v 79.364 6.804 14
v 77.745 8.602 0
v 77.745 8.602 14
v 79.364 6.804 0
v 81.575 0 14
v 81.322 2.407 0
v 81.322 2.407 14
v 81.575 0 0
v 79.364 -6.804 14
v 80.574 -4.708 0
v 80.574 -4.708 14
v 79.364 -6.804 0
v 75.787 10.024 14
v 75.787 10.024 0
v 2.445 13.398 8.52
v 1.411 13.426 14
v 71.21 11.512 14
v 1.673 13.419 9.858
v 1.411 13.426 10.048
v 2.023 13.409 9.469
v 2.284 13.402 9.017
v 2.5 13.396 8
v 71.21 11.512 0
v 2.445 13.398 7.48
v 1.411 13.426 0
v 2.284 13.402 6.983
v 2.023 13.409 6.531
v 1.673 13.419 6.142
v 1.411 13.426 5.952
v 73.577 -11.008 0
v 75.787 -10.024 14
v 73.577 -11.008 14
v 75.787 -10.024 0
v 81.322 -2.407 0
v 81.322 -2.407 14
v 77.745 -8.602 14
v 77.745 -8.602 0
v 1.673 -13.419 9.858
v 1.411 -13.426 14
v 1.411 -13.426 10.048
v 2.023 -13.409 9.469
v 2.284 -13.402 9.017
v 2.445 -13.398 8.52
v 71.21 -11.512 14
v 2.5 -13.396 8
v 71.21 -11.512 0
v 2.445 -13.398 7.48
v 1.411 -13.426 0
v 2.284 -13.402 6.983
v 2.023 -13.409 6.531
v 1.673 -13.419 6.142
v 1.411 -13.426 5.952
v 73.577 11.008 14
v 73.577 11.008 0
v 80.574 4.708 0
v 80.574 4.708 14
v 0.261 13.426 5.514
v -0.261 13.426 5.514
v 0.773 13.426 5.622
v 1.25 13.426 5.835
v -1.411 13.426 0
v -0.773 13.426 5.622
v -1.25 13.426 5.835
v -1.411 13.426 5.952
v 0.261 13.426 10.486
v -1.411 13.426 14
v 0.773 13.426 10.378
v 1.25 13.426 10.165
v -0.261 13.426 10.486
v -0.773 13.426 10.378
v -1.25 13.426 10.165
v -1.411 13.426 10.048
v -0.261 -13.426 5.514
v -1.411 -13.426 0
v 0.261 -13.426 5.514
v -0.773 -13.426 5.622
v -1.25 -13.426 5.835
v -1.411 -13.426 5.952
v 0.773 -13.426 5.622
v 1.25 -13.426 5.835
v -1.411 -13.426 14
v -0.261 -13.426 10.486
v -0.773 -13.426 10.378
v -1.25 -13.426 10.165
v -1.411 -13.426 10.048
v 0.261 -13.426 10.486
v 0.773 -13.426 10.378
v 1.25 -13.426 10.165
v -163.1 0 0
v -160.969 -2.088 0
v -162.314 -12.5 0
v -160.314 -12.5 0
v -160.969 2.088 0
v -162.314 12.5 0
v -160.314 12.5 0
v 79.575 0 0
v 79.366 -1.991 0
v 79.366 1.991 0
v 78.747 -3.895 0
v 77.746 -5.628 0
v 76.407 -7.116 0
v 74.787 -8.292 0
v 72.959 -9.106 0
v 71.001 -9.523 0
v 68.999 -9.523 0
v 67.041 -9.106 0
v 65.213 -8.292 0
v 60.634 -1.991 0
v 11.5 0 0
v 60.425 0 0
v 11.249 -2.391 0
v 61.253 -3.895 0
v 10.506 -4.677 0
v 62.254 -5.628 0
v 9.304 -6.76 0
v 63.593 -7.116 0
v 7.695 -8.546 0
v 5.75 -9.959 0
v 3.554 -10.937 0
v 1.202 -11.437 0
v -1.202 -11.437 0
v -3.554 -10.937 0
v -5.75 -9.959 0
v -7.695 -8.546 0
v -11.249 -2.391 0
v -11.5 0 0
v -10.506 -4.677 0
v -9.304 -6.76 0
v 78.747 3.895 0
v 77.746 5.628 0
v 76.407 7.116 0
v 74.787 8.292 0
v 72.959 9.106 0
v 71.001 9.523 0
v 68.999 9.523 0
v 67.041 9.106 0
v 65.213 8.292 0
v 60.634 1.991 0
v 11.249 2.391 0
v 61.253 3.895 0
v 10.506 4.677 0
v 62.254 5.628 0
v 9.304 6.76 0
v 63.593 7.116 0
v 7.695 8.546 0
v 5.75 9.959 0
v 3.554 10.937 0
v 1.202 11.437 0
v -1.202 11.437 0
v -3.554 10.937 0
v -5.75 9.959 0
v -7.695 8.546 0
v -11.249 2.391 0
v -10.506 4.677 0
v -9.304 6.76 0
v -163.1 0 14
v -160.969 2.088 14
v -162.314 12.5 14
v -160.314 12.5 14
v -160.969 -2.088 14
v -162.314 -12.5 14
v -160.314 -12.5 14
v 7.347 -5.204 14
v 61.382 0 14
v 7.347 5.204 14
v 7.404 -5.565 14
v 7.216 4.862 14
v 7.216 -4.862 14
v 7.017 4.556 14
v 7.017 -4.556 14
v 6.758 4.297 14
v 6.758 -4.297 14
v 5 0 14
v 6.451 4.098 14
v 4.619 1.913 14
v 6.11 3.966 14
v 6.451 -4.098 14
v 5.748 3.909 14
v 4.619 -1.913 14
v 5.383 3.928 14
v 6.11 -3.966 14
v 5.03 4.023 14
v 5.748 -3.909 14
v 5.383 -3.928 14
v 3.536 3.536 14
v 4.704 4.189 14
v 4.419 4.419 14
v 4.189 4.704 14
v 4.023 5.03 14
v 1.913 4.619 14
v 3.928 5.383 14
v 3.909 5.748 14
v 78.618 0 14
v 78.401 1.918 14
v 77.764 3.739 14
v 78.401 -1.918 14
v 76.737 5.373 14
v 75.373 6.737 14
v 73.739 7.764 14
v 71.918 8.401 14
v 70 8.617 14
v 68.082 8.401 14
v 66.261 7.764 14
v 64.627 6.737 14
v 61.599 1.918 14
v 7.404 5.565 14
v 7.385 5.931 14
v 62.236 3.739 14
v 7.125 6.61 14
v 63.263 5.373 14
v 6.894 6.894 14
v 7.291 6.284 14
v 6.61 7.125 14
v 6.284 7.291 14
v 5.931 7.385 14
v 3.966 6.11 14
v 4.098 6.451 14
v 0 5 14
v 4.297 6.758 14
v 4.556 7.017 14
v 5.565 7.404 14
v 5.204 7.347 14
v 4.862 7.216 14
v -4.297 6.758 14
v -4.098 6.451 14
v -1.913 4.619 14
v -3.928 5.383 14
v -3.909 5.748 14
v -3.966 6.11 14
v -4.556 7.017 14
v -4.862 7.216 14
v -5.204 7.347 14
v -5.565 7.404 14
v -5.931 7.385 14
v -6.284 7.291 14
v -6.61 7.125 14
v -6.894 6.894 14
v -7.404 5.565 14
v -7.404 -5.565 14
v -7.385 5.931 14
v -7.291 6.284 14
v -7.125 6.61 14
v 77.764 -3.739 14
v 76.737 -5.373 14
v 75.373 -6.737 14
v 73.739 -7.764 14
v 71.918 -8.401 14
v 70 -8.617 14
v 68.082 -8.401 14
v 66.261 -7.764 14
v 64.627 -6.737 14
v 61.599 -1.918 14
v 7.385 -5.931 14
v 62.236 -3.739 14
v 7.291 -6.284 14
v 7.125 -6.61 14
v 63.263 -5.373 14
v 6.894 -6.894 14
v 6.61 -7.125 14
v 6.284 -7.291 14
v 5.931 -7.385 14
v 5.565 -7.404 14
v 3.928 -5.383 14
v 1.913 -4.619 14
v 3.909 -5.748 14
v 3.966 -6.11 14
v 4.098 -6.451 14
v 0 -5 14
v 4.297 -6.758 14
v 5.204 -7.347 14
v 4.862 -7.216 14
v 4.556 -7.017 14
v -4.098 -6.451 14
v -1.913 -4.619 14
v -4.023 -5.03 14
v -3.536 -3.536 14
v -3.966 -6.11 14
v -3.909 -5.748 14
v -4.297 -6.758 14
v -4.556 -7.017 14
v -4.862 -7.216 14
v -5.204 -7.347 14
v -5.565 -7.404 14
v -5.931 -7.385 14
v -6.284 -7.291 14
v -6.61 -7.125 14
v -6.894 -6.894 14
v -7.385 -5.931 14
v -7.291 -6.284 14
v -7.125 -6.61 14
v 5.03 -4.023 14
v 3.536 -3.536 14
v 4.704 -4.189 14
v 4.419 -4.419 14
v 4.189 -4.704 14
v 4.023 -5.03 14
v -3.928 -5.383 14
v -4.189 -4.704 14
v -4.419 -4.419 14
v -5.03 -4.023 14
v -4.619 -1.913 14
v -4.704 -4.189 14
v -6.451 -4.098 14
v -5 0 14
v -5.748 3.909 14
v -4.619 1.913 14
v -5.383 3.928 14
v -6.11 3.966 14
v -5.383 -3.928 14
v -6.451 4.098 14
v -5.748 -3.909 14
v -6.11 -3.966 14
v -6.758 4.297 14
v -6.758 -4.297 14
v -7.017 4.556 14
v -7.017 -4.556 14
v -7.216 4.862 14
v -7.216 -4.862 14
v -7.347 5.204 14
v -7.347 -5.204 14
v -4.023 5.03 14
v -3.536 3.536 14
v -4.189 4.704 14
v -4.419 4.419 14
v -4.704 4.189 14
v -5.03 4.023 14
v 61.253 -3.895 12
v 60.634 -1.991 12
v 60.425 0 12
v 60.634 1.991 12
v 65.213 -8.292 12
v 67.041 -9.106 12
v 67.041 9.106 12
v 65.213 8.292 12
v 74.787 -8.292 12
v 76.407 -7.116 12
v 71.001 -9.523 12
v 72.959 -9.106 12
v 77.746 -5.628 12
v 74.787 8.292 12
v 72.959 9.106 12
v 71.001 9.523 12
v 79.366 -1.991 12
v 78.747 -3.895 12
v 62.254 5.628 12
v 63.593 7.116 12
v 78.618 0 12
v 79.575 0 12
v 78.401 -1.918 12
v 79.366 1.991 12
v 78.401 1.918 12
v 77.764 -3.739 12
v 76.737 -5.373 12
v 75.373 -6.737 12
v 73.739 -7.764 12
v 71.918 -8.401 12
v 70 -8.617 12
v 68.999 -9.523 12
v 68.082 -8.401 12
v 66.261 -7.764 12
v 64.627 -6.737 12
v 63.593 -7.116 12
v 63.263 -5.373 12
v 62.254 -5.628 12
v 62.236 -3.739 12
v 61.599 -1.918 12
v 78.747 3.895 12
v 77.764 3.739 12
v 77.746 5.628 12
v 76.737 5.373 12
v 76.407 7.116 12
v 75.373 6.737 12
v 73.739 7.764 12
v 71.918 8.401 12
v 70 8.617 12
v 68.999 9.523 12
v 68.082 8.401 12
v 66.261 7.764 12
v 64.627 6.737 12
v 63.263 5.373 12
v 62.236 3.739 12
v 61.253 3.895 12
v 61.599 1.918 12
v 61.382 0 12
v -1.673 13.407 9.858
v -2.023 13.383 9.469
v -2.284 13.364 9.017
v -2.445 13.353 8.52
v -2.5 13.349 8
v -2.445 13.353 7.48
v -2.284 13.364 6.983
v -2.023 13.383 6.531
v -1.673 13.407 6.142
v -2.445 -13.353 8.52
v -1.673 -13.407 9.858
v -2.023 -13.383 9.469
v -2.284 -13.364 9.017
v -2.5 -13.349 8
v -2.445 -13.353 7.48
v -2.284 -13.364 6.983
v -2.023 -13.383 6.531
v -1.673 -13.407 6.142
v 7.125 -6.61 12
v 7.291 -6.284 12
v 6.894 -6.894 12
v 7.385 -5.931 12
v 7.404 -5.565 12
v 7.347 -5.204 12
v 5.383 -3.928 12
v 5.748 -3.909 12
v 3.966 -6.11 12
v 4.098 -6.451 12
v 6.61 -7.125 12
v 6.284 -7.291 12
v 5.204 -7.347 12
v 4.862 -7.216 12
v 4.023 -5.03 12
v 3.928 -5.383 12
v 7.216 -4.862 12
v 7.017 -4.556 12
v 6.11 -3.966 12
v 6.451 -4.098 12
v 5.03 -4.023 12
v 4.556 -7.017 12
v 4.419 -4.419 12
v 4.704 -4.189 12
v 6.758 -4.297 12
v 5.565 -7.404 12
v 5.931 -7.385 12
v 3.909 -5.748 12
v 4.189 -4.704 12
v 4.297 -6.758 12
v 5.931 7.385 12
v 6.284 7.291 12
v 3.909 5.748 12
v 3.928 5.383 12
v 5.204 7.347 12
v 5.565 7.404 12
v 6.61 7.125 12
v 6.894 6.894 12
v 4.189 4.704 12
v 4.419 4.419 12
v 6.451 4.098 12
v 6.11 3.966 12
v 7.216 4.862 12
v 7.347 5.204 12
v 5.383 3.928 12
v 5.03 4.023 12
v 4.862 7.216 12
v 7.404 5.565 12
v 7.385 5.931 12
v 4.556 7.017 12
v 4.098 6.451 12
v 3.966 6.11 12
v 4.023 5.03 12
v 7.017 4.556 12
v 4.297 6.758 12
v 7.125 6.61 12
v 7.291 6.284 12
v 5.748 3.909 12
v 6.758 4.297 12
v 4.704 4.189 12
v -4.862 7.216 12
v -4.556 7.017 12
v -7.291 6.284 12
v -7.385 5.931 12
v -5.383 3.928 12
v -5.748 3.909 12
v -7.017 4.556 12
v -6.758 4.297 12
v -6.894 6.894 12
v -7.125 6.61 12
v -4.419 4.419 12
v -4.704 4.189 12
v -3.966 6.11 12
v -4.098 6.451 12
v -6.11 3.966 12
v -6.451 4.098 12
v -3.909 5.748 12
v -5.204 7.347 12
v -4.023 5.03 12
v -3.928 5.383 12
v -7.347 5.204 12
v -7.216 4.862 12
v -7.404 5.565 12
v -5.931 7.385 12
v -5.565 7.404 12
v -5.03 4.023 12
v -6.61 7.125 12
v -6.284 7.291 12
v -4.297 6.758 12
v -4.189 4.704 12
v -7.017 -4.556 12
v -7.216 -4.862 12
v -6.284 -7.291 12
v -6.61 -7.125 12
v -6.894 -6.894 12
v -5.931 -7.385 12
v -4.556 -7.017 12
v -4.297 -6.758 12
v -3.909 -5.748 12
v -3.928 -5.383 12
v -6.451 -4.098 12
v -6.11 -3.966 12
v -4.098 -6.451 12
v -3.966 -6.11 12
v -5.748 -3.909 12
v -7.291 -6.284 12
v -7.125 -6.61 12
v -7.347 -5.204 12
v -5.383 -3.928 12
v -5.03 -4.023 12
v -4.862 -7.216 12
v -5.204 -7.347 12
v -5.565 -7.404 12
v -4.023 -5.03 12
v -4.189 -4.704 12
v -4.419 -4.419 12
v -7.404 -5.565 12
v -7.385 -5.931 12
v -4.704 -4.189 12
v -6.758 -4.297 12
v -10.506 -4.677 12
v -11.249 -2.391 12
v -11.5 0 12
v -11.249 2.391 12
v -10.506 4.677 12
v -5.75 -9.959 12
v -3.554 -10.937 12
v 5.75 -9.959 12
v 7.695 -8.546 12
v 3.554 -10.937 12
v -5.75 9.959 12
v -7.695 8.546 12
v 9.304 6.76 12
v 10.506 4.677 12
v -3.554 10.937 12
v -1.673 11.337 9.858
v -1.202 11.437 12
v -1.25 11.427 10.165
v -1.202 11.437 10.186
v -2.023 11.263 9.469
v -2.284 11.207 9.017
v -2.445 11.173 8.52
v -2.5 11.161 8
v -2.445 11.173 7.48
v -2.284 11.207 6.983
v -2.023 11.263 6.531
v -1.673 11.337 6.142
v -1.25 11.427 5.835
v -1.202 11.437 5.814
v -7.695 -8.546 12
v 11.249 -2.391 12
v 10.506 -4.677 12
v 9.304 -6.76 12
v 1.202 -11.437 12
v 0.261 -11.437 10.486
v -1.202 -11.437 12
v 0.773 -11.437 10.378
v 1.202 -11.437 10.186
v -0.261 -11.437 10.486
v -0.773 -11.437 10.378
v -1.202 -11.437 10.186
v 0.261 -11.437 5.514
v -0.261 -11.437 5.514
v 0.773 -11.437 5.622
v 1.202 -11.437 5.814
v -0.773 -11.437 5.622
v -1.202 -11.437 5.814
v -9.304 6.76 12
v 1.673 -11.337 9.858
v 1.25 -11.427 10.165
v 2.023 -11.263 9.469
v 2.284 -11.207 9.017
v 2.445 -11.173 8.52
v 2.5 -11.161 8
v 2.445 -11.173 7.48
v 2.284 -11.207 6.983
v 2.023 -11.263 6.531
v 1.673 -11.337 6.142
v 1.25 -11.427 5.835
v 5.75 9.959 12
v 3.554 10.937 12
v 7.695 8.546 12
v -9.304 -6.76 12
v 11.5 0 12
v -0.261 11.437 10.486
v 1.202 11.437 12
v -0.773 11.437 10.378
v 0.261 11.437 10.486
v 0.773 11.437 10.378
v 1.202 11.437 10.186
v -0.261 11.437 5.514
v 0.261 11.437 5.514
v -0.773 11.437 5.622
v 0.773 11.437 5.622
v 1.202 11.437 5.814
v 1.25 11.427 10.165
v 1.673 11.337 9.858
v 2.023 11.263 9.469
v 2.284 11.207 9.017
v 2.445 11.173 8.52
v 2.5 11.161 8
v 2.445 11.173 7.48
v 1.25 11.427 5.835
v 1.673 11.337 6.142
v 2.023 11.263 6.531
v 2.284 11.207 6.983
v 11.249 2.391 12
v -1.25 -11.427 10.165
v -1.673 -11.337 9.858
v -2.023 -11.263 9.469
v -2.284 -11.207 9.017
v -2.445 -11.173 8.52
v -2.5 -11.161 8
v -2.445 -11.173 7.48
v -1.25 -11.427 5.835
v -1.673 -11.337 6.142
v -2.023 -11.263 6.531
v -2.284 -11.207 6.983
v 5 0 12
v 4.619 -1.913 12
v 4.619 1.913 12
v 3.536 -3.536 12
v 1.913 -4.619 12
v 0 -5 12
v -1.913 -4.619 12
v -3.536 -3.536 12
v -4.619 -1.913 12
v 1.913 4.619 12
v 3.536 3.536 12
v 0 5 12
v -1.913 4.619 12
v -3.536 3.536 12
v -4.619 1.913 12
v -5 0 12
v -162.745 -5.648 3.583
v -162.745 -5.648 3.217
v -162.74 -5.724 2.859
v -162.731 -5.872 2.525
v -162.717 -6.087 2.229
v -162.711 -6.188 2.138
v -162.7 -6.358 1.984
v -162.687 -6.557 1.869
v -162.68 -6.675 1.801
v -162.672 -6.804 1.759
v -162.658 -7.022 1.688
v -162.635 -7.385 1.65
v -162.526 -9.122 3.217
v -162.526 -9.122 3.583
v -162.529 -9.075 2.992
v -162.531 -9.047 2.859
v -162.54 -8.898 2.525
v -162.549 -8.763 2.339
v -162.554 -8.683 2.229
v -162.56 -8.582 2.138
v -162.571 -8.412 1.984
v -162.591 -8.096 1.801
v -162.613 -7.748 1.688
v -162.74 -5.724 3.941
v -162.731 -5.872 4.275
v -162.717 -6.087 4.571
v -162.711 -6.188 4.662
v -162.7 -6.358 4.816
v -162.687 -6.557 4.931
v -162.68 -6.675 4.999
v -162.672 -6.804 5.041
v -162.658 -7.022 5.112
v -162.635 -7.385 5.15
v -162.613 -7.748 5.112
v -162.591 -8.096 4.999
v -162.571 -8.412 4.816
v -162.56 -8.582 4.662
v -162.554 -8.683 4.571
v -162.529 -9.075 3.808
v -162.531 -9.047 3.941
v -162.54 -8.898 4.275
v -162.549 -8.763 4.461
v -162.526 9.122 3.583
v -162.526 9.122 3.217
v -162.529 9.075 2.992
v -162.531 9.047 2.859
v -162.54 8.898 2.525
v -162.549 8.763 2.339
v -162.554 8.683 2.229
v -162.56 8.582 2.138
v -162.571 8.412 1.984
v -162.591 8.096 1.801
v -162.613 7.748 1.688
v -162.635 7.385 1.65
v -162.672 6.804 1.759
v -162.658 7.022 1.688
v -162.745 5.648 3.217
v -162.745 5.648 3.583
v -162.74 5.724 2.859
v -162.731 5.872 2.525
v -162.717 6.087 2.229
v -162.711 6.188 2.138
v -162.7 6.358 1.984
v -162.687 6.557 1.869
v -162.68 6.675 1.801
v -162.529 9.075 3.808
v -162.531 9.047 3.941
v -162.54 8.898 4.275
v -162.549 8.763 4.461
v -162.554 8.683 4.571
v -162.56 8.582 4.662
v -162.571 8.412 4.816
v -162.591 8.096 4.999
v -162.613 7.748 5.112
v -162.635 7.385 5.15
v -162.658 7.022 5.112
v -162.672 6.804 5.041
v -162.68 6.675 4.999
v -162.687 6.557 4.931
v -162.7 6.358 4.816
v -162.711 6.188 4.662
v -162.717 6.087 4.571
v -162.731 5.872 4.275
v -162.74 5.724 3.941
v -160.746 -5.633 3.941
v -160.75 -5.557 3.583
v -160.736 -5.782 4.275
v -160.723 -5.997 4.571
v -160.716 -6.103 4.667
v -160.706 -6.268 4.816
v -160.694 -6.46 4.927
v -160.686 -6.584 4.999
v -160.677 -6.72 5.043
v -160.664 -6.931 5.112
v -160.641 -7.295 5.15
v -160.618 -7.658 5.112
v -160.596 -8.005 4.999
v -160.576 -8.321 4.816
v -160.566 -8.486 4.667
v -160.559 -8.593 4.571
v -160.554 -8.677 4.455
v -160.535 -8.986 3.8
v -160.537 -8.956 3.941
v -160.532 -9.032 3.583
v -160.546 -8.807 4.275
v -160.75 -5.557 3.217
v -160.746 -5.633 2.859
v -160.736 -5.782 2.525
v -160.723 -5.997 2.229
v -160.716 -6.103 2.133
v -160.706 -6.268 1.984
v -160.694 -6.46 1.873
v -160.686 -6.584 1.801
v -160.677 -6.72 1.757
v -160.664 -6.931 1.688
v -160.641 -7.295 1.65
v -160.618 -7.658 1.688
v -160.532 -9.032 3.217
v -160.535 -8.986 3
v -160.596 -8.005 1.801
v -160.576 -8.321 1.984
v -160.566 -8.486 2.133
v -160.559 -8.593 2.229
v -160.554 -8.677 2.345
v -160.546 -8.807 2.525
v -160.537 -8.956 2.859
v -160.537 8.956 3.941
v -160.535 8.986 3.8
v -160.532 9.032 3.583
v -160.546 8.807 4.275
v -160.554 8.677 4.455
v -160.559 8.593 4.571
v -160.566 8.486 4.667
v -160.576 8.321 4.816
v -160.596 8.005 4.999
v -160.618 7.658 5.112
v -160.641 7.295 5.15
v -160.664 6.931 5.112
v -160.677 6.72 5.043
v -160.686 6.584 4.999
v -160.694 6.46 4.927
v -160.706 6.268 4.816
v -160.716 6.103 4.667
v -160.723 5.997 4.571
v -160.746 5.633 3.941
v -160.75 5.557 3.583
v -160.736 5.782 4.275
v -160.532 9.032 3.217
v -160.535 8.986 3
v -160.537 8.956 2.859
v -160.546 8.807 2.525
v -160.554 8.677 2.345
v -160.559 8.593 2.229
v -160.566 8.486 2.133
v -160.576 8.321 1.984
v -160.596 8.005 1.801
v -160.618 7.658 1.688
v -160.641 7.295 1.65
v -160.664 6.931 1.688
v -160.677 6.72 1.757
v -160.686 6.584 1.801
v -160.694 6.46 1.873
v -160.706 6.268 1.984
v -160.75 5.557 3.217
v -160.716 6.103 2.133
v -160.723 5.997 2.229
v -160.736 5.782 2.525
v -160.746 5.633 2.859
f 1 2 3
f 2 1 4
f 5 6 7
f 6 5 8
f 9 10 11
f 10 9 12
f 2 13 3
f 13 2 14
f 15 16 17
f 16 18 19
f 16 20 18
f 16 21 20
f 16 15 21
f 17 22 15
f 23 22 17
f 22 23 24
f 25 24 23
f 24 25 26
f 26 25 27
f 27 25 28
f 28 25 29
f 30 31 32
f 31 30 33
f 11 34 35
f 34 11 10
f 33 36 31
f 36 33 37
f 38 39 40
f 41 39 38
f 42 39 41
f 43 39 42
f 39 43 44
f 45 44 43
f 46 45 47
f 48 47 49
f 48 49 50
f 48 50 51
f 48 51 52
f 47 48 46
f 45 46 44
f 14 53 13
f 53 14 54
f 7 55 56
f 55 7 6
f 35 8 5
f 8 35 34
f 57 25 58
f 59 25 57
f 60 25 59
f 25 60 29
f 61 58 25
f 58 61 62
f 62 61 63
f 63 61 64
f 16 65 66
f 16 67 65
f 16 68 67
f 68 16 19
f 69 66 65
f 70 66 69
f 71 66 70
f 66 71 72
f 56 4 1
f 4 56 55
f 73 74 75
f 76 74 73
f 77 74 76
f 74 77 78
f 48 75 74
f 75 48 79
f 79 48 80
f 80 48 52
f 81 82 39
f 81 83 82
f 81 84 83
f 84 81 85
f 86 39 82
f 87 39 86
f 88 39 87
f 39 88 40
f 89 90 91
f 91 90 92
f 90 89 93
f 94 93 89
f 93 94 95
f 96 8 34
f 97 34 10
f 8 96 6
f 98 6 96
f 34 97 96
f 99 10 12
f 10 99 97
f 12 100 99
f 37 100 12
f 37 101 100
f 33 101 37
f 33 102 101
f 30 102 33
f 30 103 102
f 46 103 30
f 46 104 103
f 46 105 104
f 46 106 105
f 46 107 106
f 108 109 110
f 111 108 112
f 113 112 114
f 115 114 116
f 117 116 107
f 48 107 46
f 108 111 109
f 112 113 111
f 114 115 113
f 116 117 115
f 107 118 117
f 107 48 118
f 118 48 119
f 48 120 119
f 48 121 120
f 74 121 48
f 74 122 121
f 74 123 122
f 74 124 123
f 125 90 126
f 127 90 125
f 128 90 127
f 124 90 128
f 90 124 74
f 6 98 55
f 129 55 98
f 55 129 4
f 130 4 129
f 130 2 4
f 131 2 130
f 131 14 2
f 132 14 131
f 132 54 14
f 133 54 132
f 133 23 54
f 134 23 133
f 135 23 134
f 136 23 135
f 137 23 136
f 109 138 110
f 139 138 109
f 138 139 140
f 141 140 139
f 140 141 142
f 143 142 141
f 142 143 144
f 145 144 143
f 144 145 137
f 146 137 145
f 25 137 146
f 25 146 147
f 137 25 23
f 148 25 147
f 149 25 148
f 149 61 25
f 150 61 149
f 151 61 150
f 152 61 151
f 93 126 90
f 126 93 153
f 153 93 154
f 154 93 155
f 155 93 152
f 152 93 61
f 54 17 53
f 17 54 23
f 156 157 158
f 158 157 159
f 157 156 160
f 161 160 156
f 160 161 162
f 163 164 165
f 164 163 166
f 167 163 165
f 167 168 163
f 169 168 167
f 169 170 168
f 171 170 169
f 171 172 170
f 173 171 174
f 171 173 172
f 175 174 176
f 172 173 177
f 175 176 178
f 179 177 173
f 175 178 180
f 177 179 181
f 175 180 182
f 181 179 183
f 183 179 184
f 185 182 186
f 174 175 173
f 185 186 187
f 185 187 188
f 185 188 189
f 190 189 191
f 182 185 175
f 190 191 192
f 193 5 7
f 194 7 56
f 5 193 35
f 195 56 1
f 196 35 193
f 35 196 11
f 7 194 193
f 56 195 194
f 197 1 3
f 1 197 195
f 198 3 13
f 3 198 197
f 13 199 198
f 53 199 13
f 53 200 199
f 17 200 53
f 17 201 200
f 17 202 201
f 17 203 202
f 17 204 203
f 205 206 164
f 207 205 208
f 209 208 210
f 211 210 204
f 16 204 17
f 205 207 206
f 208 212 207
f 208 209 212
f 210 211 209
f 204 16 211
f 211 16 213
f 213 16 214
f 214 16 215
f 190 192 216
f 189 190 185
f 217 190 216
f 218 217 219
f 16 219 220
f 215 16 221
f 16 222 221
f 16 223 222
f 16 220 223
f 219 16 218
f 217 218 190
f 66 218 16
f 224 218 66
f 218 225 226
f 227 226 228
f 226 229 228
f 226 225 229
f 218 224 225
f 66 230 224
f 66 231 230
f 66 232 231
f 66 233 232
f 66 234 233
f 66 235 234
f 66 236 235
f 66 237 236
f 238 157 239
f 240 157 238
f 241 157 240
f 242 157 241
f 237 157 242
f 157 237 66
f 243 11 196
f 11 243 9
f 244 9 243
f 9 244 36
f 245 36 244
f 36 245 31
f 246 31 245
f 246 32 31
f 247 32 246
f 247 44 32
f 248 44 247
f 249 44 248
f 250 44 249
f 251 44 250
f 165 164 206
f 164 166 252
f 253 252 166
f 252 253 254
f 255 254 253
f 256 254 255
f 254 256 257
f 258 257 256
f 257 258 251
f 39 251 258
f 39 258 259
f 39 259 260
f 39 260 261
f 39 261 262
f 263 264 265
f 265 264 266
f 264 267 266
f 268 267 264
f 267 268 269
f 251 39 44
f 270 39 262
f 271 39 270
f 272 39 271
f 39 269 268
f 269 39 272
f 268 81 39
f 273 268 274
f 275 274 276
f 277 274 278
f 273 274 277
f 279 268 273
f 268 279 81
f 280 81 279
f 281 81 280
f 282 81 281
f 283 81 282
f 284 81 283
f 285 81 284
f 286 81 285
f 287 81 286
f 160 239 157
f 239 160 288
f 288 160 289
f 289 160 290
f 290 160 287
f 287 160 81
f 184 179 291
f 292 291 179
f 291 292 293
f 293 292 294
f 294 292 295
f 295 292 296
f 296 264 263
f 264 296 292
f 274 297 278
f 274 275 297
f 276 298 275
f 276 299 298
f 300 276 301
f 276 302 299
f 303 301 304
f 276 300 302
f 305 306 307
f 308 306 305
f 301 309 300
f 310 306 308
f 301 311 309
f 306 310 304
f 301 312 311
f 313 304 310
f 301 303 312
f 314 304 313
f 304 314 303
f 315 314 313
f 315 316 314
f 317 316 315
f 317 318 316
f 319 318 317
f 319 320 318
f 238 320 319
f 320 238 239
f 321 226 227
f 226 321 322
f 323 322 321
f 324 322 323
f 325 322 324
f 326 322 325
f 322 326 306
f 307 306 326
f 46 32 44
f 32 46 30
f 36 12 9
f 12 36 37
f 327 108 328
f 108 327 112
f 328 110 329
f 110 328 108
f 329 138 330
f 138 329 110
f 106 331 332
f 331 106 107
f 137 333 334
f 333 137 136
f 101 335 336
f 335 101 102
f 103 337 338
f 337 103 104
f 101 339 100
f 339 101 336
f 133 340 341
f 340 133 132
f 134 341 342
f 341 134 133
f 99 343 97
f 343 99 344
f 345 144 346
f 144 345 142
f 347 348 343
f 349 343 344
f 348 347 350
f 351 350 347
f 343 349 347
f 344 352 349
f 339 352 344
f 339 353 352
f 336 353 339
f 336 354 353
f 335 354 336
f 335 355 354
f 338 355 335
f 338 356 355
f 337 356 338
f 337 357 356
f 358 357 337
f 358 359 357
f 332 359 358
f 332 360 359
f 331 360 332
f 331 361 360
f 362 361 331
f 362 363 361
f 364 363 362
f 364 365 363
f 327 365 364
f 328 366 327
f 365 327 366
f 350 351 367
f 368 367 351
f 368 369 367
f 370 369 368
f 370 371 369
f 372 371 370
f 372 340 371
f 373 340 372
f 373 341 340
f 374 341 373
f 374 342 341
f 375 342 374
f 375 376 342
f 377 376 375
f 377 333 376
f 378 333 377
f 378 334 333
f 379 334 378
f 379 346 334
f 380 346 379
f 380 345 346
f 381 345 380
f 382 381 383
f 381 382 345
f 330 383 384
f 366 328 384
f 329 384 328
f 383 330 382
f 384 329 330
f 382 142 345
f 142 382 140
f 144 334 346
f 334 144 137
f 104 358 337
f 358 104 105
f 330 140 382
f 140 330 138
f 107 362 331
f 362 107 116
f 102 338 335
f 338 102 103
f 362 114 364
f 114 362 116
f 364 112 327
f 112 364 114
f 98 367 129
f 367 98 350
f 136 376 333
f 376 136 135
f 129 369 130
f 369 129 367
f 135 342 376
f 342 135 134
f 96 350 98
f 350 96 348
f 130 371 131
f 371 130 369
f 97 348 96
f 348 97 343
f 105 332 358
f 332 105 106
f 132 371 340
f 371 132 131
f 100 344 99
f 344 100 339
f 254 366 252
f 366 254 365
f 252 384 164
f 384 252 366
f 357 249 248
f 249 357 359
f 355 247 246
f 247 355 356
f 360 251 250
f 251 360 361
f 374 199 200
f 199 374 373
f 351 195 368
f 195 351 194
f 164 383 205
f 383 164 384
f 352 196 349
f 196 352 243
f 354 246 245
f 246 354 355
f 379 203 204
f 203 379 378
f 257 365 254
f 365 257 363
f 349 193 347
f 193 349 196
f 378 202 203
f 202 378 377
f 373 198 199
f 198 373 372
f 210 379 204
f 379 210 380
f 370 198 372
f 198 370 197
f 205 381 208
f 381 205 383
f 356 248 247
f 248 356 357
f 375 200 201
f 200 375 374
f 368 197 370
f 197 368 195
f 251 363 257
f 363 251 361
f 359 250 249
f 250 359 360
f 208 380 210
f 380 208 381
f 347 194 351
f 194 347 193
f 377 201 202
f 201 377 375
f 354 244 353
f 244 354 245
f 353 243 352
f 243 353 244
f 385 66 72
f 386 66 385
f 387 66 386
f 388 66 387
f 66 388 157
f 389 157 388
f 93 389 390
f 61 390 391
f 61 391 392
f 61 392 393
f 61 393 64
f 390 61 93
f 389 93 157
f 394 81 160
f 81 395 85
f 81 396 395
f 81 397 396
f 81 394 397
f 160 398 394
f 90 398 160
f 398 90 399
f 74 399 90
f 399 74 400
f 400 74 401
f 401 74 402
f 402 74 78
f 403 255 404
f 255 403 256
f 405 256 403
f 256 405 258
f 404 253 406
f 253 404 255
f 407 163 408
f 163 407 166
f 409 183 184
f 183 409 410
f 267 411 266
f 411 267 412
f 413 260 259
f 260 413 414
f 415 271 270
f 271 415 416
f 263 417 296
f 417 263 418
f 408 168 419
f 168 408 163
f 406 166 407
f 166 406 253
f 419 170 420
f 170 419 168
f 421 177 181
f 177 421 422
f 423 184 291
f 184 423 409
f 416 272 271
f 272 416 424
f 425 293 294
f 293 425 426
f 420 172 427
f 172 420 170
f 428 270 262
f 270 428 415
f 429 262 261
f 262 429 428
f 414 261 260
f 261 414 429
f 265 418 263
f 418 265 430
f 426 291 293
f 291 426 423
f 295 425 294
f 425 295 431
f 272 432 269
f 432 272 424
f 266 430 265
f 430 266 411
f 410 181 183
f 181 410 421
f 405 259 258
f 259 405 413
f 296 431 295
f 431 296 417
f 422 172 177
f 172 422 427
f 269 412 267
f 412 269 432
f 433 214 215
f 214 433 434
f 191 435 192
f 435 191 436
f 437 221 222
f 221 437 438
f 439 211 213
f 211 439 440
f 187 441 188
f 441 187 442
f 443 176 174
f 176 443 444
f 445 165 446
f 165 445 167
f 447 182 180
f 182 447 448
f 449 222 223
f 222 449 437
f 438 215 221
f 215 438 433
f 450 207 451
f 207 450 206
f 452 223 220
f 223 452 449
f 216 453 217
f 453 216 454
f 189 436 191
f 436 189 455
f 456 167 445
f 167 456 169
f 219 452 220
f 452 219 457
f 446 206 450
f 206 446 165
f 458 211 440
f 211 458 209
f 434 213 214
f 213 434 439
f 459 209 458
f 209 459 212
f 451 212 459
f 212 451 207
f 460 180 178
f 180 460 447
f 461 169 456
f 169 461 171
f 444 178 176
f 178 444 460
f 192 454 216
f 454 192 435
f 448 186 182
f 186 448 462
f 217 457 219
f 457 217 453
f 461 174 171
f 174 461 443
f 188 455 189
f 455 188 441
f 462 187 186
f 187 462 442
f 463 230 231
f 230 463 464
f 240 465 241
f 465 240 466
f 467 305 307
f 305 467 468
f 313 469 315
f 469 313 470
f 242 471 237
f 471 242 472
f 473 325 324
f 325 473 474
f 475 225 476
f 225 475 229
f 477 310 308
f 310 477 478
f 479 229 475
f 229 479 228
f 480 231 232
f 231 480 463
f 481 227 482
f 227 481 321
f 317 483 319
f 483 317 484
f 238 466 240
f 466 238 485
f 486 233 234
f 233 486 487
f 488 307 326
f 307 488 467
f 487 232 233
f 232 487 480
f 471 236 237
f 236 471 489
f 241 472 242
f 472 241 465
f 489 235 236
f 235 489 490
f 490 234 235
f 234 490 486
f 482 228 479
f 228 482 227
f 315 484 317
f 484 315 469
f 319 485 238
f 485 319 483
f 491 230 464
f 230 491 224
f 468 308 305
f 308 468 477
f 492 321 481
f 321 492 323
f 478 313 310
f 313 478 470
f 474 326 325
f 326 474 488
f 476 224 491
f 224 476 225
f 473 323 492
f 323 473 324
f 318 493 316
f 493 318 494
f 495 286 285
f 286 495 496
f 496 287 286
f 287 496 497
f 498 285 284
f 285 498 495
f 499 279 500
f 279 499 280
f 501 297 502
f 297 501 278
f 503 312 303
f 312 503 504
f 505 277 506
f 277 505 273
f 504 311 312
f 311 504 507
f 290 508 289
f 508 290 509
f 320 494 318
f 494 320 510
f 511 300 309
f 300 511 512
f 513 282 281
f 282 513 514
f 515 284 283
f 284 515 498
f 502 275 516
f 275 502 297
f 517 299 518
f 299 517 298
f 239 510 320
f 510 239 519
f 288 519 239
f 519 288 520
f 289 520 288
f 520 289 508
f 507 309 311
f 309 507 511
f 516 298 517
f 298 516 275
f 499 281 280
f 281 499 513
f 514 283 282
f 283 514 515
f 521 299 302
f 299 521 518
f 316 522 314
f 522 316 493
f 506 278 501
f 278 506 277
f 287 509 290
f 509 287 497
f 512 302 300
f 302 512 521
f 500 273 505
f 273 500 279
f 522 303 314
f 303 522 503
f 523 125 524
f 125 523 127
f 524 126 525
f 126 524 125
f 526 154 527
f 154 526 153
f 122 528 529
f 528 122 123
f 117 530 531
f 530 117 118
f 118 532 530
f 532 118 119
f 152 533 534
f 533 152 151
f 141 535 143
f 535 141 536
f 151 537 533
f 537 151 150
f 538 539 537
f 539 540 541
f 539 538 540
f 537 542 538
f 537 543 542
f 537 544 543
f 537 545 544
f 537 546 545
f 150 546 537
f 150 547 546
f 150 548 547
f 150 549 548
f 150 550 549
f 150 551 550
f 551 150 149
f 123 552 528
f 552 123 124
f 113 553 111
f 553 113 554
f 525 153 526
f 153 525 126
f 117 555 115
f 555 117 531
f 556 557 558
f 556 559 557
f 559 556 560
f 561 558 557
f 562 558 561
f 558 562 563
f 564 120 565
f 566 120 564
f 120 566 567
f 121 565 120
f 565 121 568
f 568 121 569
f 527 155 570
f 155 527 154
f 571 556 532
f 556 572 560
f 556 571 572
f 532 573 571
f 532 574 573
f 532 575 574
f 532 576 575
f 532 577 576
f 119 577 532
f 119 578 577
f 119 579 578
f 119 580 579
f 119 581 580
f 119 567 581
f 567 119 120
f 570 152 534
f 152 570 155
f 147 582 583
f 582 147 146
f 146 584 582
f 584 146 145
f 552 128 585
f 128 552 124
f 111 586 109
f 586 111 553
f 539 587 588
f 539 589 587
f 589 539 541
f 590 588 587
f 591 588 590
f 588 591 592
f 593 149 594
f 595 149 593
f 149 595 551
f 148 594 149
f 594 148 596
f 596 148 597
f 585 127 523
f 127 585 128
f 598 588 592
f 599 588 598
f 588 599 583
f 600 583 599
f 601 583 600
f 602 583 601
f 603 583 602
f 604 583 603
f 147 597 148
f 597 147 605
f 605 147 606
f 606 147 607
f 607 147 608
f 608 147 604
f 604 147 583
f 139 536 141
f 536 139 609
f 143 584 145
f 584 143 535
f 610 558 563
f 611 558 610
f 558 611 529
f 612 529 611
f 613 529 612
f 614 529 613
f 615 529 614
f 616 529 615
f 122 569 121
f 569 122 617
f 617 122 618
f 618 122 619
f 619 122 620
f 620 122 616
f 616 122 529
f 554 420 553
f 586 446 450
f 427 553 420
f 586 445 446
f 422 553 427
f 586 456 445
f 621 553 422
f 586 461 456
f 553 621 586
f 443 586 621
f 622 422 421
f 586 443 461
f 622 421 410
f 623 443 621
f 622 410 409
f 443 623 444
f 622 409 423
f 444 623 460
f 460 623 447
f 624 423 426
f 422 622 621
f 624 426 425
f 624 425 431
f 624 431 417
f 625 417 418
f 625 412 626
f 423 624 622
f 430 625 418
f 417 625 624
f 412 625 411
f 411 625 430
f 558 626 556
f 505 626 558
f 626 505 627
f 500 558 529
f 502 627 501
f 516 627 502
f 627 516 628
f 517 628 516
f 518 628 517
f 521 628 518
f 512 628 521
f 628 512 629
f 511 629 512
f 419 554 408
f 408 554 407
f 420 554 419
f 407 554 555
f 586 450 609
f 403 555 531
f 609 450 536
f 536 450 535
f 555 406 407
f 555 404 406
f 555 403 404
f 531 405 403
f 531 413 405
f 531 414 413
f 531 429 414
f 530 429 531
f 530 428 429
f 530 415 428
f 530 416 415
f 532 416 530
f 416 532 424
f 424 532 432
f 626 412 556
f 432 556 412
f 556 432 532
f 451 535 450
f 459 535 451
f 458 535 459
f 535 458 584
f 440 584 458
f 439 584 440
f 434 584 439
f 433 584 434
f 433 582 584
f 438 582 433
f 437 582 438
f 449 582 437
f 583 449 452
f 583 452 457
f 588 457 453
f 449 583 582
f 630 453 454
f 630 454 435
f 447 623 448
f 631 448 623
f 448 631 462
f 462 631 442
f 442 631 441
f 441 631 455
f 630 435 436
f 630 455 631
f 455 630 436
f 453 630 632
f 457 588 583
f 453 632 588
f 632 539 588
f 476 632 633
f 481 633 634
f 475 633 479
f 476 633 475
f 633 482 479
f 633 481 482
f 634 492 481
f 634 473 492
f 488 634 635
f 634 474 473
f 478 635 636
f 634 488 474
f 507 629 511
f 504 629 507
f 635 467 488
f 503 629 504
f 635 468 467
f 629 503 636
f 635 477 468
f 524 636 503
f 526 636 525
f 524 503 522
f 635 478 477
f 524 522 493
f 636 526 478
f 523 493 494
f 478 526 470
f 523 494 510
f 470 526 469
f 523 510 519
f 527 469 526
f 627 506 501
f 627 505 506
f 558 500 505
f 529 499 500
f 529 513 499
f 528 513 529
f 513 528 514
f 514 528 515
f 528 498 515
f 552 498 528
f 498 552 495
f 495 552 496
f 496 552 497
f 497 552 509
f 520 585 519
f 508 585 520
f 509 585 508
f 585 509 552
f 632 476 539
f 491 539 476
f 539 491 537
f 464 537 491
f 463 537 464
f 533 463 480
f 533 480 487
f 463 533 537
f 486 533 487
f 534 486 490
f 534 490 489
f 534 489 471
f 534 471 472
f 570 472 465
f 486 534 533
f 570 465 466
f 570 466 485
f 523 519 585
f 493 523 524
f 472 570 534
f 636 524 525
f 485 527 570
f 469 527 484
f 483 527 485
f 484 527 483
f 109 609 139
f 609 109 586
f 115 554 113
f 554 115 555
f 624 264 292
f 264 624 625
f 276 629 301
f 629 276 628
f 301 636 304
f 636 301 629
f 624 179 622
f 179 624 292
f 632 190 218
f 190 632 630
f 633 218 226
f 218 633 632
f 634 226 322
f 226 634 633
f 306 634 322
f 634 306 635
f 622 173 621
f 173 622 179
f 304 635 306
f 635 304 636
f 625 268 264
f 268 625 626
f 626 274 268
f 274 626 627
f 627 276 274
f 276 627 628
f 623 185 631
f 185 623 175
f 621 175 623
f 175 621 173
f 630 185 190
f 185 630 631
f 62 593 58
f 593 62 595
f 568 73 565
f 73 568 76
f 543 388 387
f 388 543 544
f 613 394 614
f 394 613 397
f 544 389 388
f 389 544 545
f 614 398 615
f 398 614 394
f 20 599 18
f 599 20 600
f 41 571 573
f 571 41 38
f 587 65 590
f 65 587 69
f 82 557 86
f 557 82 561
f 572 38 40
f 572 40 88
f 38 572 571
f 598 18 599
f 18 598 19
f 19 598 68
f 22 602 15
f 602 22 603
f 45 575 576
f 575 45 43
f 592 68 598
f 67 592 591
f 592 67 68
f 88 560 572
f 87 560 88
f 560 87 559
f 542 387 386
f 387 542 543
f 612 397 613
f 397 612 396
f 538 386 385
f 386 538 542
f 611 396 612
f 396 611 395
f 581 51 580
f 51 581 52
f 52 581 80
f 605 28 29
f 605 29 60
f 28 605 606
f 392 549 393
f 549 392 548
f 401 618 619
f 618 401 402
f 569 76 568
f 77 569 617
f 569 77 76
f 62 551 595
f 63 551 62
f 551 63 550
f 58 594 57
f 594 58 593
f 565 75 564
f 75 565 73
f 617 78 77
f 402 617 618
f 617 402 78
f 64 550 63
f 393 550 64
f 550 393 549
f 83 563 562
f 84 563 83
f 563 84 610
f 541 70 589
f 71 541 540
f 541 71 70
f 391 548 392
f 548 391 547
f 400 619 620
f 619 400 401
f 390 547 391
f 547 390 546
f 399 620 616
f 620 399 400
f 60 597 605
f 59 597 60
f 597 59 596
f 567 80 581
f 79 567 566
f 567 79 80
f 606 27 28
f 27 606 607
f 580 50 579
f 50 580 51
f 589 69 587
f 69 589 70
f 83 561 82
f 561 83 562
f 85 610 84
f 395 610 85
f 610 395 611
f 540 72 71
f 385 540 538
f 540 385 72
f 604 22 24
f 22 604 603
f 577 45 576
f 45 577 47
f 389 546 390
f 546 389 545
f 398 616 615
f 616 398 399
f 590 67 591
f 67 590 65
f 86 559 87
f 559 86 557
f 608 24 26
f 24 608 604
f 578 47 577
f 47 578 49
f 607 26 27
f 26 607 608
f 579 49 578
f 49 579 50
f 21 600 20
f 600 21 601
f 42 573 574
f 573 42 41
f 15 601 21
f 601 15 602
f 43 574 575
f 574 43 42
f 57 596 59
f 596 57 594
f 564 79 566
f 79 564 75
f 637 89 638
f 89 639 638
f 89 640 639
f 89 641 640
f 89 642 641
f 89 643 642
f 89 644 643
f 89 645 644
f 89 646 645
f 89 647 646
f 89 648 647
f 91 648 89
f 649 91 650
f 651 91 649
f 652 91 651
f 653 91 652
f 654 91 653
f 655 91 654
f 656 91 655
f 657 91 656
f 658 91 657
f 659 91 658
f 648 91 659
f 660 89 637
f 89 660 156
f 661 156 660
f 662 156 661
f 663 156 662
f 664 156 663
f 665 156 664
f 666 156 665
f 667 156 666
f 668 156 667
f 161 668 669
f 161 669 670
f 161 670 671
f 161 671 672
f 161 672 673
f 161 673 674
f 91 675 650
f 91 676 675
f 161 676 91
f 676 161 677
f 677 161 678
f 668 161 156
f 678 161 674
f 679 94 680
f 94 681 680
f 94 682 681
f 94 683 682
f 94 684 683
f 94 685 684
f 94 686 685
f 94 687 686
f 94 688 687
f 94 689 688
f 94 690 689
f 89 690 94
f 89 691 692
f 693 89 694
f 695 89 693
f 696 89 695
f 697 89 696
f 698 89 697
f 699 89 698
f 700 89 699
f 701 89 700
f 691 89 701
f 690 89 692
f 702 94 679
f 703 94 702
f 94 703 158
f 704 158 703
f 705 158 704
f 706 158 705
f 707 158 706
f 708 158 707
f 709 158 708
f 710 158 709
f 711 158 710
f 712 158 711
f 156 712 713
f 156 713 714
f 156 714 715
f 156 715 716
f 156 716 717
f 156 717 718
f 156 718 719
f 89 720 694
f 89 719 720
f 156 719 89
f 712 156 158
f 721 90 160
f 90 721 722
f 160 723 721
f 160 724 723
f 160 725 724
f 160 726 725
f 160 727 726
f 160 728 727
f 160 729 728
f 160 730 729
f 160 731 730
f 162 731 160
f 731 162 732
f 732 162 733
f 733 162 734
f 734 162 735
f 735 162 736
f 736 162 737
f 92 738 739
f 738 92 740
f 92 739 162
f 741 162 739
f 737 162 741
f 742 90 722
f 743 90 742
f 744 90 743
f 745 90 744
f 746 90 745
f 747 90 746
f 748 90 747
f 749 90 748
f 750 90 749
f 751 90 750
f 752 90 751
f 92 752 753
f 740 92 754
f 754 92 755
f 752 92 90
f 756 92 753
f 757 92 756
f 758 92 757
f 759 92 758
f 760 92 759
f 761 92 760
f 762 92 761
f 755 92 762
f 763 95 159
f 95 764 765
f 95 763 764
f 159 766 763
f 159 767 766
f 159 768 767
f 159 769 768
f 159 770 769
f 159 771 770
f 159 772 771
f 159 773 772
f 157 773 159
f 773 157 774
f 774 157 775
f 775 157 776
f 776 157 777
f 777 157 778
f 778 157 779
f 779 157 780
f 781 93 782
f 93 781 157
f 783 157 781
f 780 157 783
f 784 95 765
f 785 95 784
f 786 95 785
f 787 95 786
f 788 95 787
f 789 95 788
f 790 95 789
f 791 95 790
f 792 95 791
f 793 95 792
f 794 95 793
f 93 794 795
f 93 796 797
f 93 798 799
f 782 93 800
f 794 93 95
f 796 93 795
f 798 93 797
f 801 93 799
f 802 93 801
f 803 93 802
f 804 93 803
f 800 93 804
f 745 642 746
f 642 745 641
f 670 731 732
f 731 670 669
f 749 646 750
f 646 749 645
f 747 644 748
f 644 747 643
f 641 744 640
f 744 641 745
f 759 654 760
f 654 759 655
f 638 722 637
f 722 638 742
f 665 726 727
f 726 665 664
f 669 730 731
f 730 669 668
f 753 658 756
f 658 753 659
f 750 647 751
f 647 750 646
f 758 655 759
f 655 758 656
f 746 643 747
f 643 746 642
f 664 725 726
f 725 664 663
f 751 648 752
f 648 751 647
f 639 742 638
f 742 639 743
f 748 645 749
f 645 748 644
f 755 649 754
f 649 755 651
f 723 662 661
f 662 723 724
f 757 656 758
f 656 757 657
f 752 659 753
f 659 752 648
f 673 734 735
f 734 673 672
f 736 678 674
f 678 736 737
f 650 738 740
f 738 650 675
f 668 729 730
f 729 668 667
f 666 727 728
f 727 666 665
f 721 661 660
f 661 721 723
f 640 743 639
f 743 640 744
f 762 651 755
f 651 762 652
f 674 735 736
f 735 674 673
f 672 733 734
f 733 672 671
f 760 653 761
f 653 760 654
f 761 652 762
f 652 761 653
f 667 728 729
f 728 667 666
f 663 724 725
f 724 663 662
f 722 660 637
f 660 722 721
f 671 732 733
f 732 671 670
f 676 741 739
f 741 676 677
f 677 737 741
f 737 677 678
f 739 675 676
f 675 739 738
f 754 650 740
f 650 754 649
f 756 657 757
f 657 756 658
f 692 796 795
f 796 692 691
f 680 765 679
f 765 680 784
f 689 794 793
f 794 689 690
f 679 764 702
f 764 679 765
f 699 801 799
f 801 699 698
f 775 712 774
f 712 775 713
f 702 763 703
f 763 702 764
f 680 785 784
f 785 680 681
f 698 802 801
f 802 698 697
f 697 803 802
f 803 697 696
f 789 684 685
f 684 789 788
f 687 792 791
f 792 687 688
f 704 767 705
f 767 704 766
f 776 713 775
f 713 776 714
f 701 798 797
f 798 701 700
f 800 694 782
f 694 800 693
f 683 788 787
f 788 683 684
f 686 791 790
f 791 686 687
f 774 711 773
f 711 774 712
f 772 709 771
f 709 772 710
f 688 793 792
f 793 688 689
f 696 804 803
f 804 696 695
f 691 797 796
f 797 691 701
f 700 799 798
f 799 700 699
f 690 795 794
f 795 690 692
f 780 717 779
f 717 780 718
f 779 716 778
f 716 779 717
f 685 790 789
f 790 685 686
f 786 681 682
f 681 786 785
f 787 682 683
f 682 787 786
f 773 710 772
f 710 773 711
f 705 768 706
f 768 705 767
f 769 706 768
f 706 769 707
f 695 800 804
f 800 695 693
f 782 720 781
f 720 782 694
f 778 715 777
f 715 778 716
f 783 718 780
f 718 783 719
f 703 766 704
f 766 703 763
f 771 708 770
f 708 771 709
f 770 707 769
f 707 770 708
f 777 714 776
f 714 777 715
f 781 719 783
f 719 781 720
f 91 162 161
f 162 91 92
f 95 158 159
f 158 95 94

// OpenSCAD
inch = 25.4;

globe_d = 13 * inch;
globe_r = globe_d/2;
globe_thickness = 2;
globe_ir = globe_r - globe_thickness;


height = 14;

RR = 70;
rr = RR - 40;
dd = 8; // magnet support offset from globe_ir

flange_d = 23;
um3_tol = .1;
penny_d = .75 * inch + um3_tol;
penny_t = .06 * inch;

module penny_compartment(dd){
  difference(){
    hull(){
      translate([0,0,0])cylinder(d=flange_d + 4, h=height);
      translate([-dd,0,0])cylinder(d=penny_d + 4, h=height);
    }
    translate([0,0,-2])translate([-dd,0,0])cylinder(d=penny_d, h=height);
    translate([0,0,-2])translate([-dd,0,0])cylinder(d=penny_d * .9, h=height * 2);
  }
  difference(){
    cylinder(d=flange_d + 4, h=.2);
    translate([0,0,-1])cylinder(d=penny_d - .2, h=3);
  }
}

module aov_arm(){
  rotate([0,0,180]){
    difference(){
      union(){
	hull(){
	  cylinder(d=flange_d + 4, h=height);
	  translate([globe_ir-1,-2,0])cube([.1,4,height]);
	}
	penny_compartment(70);
      }
      translate([0,0,-1])cylinder(h=height-1, d=flange_d);
      translate([0,0,-1])cylinder(h=height*2, d=10);
      for(i=[1:4]){
	rotate([0,0,45 + 90 * i])translate([8,0,0])cylinder(d=3.5, h=30, $fn=30);
      }
      translate([0,0,8])rotate([90,0,0])cylinder(d=5, h=40, $fn=30, center=true);
    }

    intersection(){
      difference(){
	cylinder(r=globe_ir, h=height, $fn=50);
	translate([0,0,-1])cylinder(r=globe_ir-2, h=height+2, $fn=50);
	rotate([90,0,0])translate([0,8,0])cylinder(d=5, h=30, $fn=30);
	rotate([0, 0, 180+2.6])translate([-200, 0, 3.4])
	  rotate([0, 90, 0])cylinder(d=3.5, h=100, $fn=30);
	rotate([0, 0, 180-2.6])translate([-200, 0, 3.4])
	  rotate([0, 90, 0])cylinder(d=3.5, h=100, $fn=30);
      }
      translate([100,0,0])cube([200, 25, 100], center=true);
    }
  }
}
aov_arm();
//penny_compartment(0);
